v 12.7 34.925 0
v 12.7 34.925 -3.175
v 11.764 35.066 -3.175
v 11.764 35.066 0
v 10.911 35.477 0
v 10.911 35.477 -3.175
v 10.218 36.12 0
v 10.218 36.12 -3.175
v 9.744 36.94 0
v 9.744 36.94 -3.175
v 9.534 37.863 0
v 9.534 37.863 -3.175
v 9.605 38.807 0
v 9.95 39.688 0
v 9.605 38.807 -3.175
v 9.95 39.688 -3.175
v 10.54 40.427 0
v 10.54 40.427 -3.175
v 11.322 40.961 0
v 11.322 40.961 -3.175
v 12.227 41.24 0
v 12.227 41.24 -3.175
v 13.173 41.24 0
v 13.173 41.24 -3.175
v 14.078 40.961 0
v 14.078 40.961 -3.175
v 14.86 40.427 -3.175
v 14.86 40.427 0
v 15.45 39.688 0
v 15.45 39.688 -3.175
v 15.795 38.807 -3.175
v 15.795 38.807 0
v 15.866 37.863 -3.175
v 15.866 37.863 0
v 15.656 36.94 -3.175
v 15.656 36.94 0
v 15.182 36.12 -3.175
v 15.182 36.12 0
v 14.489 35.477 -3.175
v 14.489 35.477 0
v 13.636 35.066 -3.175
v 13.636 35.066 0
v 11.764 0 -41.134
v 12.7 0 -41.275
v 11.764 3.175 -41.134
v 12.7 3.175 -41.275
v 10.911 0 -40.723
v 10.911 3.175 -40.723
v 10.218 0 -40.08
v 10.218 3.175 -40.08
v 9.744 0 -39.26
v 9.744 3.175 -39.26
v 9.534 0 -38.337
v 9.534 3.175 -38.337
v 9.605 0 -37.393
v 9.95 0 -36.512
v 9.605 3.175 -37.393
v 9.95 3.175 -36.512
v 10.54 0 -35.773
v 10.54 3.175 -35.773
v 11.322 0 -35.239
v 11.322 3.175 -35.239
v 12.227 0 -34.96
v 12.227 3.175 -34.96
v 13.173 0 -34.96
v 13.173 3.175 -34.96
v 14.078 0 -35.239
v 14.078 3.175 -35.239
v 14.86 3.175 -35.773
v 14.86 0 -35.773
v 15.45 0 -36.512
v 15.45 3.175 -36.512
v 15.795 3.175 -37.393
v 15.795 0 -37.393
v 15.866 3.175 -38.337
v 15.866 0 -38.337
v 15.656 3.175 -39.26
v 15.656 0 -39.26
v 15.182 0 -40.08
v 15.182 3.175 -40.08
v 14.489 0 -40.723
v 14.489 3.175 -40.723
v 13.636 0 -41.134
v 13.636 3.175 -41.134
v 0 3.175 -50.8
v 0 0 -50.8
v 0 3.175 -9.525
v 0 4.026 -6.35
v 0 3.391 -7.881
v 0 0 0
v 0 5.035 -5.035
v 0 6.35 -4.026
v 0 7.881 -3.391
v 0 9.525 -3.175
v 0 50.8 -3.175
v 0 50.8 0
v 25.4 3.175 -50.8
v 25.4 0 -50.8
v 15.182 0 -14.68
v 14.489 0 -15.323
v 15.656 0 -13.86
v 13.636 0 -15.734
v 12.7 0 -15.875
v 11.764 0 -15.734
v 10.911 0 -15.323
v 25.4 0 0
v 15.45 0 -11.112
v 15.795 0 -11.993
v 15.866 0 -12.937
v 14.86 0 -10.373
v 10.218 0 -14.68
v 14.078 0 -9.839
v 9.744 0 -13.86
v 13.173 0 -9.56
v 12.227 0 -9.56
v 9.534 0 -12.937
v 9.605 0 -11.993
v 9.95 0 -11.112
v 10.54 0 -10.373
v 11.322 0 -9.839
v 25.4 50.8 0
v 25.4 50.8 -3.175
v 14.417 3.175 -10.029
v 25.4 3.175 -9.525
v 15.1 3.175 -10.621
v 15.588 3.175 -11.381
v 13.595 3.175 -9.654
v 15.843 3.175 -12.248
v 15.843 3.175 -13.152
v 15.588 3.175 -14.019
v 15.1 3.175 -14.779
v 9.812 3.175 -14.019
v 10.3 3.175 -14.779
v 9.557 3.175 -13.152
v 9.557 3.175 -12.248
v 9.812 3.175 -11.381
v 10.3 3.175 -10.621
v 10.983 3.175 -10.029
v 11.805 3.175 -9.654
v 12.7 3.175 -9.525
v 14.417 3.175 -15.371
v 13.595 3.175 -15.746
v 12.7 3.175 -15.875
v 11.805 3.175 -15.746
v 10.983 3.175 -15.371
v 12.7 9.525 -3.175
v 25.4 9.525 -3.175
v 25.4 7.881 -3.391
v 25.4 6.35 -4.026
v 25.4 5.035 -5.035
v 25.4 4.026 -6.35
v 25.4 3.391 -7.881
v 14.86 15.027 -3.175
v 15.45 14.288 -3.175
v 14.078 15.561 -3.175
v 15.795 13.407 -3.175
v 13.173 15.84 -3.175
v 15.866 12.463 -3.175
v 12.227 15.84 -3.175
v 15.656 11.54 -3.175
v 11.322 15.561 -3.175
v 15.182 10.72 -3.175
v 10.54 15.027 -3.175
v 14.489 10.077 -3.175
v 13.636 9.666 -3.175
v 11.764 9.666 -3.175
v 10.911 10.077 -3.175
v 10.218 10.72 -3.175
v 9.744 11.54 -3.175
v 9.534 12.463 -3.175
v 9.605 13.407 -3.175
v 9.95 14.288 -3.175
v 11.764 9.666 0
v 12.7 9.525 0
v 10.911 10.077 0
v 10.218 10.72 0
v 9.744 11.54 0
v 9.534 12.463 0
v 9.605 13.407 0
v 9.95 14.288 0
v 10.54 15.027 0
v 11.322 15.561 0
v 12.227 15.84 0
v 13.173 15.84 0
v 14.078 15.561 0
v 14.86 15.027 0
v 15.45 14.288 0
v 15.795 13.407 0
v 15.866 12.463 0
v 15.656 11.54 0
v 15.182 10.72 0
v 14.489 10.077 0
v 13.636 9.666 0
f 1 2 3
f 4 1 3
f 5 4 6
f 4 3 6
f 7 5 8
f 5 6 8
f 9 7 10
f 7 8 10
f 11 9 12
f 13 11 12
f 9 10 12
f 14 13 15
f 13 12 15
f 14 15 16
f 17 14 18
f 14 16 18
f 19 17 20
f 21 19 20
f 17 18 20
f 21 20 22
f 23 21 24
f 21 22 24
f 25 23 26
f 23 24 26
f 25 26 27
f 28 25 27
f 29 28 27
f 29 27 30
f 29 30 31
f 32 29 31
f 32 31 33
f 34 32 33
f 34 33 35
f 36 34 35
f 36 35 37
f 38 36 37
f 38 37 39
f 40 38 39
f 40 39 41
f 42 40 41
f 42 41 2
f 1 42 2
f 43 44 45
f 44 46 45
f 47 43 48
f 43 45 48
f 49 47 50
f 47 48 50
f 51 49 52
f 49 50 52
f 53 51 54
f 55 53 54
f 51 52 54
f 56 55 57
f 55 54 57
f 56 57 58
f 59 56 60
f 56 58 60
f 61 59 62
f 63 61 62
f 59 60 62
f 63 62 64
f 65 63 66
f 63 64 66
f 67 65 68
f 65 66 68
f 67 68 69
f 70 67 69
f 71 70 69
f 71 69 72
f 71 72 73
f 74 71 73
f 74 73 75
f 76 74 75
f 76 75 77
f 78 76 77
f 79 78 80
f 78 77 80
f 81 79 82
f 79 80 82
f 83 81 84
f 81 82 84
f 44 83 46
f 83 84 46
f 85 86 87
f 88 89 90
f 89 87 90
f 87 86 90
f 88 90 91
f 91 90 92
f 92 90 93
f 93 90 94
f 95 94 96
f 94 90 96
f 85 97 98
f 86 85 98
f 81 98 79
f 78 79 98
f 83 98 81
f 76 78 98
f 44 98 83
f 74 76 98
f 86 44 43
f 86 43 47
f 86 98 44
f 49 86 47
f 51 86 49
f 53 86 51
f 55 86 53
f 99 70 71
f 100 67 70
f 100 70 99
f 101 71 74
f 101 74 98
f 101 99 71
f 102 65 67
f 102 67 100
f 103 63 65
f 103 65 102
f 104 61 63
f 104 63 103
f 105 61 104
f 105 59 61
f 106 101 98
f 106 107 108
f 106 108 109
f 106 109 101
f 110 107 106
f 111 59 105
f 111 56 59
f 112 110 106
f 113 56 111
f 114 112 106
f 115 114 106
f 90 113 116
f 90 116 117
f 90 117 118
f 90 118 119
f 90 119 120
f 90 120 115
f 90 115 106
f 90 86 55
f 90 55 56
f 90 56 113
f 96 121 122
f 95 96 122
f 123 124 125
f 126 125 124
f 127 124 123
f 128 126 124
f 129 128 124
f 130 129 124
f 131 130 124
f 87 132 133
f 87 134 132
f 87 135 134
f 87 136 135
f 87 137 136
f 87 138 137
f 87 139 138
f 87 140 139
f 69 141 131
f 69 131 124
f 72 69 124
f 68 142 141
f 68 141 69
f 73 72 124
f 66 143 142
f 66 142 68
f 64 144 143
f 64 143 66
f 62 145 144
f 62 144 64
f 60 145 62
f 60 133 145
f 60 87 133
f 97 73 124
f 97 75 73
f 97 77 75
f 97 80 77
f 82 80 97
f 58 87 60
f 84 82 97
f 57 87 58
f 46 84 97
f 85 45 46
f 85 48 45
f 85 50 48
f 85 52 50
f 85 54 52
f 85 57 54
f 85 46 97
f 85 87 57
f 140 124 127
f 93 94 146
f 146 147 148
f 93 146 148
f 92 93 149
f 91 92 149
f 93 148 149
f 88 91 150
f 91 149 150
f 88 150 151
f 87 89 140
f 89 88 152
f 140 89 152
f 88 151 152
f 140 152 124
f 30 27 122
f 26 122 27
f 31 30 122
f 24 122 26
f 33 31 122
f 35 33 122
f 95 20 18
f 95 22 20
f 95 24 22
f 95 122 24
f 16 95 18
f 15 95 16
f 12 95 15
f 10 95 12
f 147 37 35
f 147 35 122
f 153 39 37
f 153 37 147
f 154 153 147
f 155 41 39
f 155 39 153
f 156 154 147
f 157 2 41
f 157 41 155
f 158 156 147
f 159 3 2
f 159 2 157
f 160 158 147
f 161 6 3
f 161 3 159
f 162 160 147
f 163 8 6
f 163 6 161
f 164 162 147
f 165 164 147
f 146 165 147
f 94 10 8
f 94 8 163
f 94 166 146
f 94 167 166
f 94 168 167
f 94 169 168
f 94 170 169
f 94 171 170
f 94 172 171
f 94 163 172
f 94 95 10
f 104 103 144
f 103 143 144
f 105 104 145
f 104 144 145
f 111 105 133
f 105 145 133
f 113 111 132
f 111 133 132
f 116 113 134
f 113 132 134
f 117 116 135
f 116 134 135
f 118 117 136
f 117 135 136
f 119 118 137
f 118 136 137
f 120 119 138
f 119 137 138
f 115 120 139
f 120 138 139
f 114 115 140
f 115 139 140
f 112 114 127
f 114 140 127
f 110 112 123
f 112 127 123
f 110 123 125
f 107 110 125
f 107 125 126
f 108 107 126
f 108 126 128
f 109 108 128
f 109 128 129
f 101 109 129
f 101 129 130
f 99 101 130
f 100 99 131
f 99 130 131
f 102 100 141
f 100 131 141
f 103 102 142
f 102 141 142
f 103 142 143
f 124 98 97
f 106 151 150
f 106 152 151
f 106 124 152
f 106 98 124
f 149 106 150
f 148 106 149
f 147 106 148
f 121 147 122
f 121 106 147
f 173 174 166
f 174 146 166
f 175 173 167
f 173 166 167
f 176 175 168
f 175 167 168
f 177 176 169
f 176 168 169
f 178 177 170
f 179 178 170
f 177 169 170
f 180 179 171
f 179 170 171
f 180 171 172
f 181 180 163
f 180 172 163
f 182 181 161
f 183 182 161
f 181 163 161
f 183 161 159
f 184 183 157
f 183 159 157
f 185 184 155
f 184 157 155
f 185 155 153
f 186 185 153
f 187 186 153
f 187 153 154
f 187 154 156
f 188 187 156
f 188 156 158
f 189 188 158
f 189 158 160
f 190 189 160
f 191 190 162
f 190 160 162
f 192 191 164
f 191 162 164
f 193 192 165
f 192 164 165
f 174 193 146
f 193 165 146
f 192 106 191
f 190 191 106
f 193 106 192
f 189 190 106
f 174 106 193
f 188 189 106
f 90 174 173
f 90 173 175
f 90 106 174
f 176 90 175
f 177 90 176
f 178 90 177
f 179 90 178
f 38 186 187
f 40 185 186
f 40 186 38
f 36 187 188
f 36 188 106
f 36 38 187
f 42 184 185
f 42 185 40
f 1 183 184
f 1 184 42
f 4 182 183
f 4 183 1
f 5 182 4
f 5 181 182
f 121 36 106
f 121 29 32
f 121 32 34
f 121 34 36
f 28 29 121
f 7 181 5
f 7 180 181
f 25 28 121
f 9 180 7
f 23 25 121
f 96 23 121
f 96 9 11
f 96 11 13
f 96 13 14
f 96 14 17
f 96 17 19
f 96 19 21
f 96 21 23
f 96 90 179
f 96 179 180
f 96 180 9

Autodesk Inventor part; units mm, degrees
ref_plane "YZ Plane" through (0, 0, 0) normal (1, 0, 0) x (0, 1, 0)
ref_plane "XZ Plane" through (0, 0, 0) normal (0, 1, 0) x (-1, 0, 0)
ref_plane "XY Plane" through (0, 0, 0) normal (0, 0, 1) x (1, 0, 0)
sketch "Sketch1" plane through (0, 0, 0) normal (1, 0, 0) x (0, 1, 0)
  line L0 (0, 0) -> (50.8, 0)
  line L1 (50.8, 0) -> (50.8, -3.175)
  line L2 (50.8, -3.175) -> (0, -3.175)
  line L3 (0, -3.175) -> (0, 0)
  line L4 (0, 0) -> (3.175, 0)
  line L5 (3.175, 0) -> (3.175, -50.8)
  line L6 (3.175, -50.8) -> (0, -50.8)
  line L7 (0, -50.8) -> (0, 0)
  dimension "d0" = 50.8
  dimension "d1" = 3.175
  dimension "d2" = 3.175
  dimension "d3" = 50.8
extrude "Extrusion1" add sketch "Sketch1" along normal blind 25.4
fillet "Fillet1" radius 6.35 1 edges at (12.7, 3.175, -3.175)
hole "Hole1" at (12.7, 0, -12.7) direction (0, 1, 0) diameter 6.35 end through all
hole "Hole2" at (12.7, 0, -38.1) direction (0, 1, 0) diameter 6.35 end through all
hole "Hole3" at (12.7, 12.7, 0) direction (0, 0, -1) diameter 6.35 end through all
hole "Hole4" at (12.7, 38.1, 0) direction (0, 0, -1) diameter 6.35 end through all
properties part number "2in 4-hole Bracket 0.25in Hole"
